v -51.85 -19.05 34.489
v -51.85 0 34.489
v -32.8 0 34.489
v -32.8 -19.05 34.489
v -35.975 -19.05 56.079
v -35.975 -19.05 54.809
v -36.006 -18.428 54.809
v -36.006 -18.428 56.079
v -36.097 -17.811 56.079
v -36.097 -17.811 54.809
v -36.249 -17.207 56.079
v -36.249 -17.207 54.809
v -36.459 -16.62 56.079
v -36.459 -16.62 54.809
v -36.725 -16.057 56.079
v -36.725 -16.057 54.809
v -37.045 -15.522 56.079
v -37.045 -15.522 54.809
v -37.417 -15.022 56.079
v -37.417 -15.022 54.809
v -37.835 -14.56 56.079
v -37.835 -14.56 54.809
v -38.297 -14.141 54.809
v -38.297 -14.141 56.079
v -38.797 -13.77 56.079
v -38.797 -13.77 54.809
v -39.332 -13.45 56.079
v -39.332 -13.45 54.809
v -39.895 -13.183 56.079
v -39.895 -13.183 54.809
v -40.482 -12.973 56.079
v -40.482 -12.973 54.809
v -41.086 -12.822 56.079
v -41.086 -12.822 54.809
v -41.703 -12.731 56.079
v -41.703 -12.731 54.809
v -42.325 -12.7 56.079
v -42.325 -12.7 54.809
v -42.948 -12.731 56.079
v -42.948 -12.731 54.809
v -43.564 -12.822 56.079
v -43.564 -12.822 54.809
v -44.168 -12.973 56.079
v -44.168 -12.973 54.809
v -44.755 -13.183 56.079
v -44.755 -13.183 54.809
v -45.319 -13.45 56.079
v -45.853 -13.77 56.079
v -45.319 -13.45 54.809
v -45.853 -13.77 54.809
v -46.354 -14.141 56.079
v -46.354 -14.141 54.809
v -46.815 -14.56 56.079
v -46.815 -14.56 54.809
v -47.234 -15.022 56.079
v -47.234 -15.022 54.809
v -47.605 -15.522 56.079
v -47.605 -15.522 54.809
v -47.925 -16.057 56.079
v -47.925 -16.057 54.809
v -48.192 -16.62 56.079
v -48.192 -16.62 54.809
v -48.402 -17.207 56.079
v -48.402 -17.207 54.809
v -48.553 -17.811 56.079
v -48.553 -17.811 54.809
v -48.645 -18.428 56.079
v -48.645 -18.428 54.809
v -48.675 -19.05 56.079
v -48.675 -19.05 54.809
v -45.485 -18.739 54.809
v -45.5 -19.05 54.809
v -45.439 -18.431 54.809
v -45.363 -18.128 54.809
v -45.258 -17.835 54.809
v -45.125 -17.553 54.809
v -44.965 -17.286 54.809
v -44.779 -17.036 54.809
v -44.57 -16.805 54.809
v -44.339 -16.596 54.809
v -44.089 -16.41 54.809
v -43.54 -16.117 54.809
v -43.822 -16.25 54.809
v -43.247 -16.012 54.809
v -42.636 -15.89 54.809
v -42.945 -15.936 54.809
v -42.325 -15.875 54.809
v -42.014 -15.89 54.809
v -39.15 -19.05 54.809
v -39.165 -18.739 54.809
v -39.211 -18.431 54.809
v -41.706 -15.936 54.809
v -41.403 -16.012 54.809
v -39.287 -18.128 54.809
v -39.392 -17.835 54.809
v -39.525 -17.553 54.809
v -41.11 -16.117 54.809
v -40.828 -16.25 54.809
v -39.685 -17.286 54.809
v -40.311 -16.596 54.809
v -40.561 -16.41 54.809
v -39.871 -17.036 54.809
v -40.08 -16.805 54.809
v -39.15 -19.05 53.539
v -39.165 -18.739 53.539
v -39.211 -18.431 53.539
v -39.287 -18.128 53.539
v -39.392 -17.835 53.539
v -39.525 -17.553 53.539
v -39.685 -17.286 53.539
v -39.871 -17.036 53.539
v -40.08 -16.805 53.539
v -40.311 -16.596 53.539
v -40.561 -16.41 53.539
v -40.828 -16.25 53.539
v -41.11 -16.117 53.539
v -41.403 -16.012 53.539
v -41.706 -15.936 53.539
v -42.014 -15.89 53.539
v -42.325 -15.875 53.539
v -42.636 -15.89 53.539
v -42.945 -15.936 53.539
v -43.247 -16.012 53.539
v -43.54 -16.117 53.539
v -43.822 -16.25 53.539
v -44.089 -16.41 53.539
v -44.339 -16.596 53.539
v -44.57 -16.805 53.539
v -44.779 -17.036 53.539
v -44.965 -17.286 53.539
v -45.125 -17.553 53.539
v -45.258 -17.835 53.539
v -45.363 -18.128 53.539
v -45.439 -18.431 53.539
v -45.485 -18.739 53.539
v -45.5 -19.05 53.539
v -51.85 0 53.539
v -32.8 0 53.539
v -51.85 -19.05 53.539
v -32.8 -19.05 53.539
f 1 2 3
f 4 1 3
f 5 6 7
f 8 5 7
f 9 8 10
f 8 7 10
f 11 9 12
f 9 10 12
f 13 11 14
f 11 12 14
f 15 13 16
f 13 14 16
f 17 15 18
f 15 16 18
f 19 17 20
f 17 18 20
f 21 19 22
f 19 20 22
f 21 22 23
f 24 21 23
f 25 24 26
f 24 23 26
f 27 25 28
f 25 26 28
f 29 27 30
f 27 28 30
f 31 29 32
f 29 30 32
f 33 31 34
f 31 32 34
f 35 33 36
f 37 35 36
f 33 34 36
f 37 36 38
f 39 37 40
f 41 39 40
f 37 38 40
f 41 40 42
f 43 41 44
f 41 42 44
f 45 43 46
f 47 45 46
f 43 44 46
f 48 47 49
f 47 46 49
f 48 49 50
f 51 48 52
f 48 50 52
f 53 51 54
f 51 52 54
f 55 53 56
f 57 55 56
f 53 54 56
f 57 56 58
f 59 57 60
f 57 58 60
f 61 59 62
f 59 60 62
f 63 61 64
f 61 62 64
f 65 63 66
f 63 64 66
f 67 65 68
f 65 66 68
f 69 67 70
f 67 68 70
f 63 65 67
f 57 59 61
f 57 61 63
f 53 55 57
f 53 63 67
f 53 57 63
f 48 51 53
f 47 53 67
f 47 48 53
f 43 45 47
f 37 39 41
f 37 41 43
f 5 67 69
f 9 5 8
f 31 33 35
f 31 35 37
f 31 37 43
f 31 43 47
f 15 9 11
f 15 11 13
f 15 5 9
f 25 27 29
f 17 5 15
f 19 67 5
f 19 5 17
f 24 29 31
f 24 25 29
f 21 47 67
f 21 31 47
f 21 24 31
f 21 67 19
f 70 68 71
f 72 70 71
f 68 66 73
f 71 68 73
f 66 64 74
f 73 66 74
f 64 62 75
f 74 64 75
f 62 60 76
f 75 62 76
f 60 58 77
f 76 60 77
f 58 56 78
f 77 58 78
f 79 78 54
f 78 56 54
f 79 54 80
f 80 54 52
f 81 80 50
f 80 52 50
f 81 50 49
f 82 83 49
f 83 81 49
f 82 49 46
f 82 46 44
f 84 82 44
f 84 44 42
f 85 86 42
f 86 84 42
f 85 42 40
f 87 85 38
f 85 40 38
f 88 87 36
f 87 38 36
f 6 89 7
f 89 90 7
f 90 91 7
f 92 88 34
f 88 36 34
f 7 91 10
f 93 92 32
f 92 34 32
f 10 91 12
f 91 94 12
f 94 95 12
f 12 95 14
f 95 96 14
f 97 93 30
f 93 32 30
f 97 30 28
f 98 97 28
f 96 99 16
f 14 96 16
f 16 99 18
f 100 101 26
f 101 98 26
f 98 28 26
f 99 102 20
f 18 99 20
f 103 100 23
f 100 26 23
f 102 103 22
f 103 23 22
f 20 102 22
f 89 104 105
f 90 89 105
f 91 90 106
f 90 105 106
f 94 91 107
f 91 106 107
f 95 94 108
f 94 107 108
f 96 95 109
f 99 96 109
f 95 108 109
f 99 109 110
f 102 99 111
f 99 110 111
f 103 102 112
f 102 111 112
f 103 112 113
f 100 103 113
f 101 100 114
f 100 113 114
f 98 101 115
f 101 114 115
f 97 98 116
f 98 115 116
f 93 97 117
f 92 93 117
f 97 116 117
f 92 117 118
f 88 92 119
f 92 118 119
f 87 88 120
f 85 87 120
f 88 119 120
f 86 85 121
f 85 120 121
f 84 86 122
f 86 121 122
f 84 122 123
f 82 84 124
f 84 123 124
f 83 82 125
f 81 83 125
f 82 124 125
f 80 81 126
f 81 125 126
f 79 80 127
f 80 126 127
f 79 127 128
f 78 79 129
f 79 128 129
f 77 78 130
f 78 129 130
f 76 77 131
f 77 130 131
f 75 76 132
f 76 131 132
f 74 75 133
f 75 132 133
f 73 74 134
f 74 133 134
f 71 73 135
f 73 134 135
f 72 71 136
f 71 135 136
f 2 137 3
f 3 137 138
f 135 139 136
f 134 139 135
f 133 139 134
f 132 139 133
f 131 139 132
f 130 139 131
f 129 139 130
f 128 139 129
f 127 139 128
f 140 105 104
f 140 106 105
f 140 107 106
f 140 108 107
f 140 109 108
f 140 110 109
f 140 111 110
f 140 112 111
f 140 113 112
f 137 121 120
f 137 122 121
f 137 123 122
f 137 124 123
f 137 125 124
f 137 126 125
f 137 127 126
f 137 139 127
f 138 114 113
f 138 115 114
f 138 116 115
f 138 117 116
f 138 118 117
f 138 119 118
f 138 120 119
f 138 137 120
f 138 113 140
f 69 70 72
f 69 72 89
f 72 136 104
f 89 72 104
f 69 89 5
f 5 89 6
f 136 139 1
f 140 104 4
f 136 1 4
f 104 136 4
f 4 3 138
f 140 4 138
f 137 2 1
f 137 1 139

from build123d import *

# Parameters (mm, degrees)
F0_W     = 19.05
F0_H     = 19.05
F1_DEPTH = 19.05
F3_DEPTH = 1.27
F5_DEPTH = 1.27


with BuildPart() as f1:
    # F0 (on Front) → F1 (new body)
    with BuildSketch(Plane.XZ):
        with Locations((-42.3251483589, 44.0142245242)):
            Rectangle(F0_W, F0_H)
    extrude(amount=F1_DEPTH)

    # F2 (on face) → F3 (join)
    with BuildSketch(Plane.XY.offset(53.5392245242)):
        with BuildLine():
            Line((-45.5001483589, -19.05), (-39.1501483589, -19.05))
            ThreePointArc((-39.1501483589, -19.05), (-42.3251483589, -15.875), (-45.5001483589, -19.05))
        make_face()
    extrude(amount=F3_DEPTH)

    # F4 (on face) → F5 (join)
    with BuildSketch(Plane.XY.offset(54.8092245242)):
        with BuildLine():
            Line((-45.5001483589, -19.05), (-39.1501483589, -19.05))
            ThreePointArc((-39.1501483589, -19.05), (-42.3251483589, -15.875), (-45.5001483589, -19.05))
        make_face()
        with BuildLine():
            Line((-39.1501483589, -19.05), (-35.9751483589, -19.05))
            ThreePointArc((-35.9751483589, -19.05), (-42.3251483589, -12.7), (-48.6751483589, -19.05))
            Line((-48.6751483589, -19.05), (-45.5001483589, -19.05))
            ThreePointArc((-45.5001483589, -19.05), (-42.3251483589, -15.875), (-39.1501483589, -19.05))
        make_face()
    extrude(amount=F5_DEPTH)


solid = f1.part
